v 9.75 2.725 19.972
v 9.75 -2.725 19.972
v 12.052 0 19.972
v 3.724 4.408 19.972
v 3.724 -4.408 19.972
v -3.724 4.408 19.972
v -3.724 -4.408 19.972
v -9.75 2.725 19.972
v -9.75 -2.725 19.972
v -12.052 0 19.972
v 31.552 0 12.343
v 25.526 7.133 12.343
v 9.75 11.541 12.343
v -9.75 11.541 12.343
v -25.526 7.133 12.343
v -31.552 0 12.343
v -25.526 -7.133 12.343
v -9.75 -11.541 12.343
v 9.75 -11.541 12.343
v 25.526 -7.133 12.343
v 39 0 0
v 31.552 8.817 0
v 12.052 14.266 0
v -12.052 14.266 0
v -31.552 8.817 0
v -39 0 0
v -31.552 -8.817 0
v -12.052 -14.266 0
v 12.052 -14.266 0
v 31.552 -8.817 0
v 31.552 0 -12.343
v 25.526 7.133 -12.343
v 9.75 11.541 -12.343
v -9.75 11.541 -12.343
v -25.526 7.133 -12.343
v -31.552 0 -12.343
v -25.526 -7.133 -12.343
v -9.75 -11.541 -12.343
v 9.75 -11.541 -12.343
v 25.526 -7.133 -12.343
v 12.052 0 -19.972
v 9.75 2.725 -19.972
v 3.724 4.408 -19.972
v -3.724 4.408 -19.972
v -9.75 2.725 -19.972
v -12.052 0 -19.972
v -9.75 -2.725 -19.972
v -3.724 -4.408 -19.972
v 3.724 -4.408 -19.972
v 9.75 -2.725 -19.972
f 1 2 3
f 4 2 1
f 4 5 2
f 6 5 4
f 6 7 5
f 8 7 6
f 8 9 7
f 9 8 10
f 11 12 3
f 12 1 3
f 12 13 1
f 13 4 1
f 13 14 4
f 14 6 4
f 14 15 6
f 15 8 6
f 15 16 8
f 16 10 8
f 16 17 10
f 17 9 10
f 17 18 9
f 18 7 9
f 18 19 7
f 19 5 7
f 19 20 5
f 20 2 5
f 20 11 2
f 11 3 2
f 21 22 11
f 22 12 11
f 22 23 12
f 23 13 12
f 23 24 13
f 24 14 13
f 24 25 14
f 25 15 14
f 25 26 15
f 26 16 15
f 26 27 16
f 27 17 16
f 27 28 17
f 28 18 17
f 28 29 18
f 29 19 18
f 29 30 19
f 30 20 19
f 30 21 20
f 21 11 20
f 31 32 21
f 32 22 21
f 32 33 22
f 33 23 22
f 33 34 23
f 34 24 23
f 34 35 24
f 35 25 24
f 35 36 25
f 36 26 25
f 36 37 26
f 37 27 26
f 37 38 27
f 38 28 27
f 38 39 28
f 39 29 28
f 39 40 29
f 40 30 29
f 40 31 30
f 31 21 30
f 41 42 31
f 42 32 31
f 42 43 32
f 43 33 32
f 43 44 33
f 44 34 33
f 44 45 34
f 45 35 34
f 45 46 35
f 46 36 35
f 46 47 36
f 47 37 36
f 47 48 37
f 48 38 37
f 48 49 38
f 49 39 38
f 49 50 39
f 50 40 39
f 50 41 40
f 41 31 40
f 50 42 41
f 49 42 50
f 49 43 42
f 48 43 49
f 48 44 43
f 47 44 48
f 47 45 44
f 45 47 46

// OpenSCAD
// Generated by SolidPython 1.0.1 on 2020-07-29 00:46:50


scale(v = [13, 5, 7]) {
	sphere(r = 3);
}
/***********************************************
*********      SolidPython code:      **********
************************************************
 
# import packages: SolidPython
from solid import *
from solid.utils import *
from itertools import chain, combinations, permutations


class Resize:

    def __init__(self, scad_file):
        self.scad_file = scad_file
        #self.scad_file = import_scad(scad_file)
        # cone/cylinder param:
        self.r1 = 0
        self.r2 = 0
        self.h = 0
        # rectangular prism param:
        self.w = 0
        self.l = 0
        # ellipse param:
        self.r = 0

    # import OpenScad code (file name corresponds to shape)


    # classify shape + parameters
    def assign(self, param1, param2, param3):
        if self.scad_file == 'cone.scad':
            self.r1 = param1
            self.r2 = param2
            self.h = param3
        elif self.scad_file == 'cylinder.scad':
            self.r1 = param1
            self.r2 = param2
            self.h = param3
        elif self.scad_file == 'rectangularPrism.scad':
            self.h = param1
            self.l = param2
            self.w = param3
        else:
            self.r = param1
            self.h = param2

    # resize parameters
    def iterate(self):
        x = range(3, 20, 2)
        i = 1
        if self.scad_file == 'cone.scad':
            tempList = list(permutations(x, 2))
            for temp in tempList:
                param1 = temp[0]
                param2 = temp[1]
                filepath = 'produced_scad_files/' + 'cone' + str(param1) + '_' + str(param2) + '_' + '.scad'
                scad_render_to_file(cylinder(h=param1, r1=param2, r2=0), filepath)

        elif self.scad_file == 'cylinder.scad':
            tempList = list(permutations(x, 3))
            for temp in tempList:
                param1 = temp[0]
                param2 = temp[1]
                filepath = 'produced_scad_files/' + 'cylinder' + str(param1) + '_' + str(param2) + '_' + '.scad'
                scad_render_to_file(cylinder(h=param1, r1=param2, r2=param2), filepath)

        elif self.scad_file == 'rectangularPrism.scad':
            tempList = list(permutations(x, 3))
            for temp in tempList:
                param1 = temp[0]
                param2 = temp[1]
                param3 = temp[2]
                filepath = 'produced_scad_files/' + 'rectangularPrism' + str(param1) + '_' + str(param2) + '_' + str(
                    param3) + '.scad'
                scad_render_to_file(cube(size=(param1, param2, param3)), filepath)

        elif self.scad_file == 'ellipse.scad':
            tempList = list(permutations(x, 4))
            for temp in tempList:
                param1 = temp[0]
                param2 = temp[1]
                param3 = temp[2]
                param4 = temp[3]
                filepath = 'produced_scad_files/' + 'ellipse' + str(param1) + '_' + str(param2) + '_' + str(param3) + '_' + str(param4) + '.scad'
                scad_render_to_file(scale([param1, param2, param3])(sphere(r=param4)), filepath)

    def render_to_scadfile(self):
        scad_render_to_file(scad, 'example.scad') 
 
************************************************/
